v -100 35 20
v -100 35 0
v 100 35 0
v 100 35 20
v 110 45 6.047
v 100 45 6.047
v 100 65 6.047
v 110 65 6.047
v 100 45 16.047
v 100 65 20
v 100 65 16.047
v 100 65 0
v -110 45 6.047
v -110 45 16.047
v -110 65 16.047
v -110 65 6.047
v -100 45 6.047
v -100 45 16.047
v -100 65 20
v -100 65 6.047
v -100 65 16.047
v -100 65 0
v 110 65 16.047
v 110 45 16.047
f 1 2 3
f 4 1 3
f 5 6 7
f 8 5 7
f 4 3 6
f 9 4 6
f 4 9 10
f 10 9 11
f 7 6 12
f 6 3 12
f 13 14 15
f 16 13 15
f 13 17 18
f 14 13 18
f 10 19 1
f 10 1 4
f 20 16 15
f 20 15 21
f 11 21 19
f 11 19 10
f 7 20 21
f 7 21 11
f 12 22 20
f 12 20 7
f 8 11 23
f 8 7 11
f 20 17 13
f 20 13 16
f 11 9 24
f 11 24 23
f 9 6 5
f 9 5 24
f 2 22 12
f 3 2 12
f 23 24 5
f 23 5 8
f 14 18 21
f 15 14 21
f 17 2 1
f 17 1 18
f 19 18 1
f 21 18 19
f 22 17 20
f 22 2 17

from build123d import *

# Parameters (mm, degrees)
F0_W     = 200
F0_H     = 30
F1_DEPTH = 20
F2_W     = 20
F2_H     = 10
F3_DEPTH = 10


with BuildPart() as f1:
    # F0 (on Top) → F1 (new body)
    with BuildSketch(Plane.XY):
        Rectangle(F0_W, F0_H)
    extrude(amount=F1_DEPTH)

    # F2 (on face) → F3 (join)
    with BuildSketch(Plane.YZ.offset(100)):
        with Locations((5, 11.047103)):
            Rectangle(F2_W, F2_H)
    extrude(amount=F3_DEPTH)

    # F4: F1 across plane


with BuildPart() as f1_1:
    add(f1.part)
    add(f1.part.mirror(Plane.YZ))


with BuildPart() as f5_1:
    # F5: copy of F1
    add(f1_1.part.moved(Location((0, 50, 0))))


solid = f5_1.part
